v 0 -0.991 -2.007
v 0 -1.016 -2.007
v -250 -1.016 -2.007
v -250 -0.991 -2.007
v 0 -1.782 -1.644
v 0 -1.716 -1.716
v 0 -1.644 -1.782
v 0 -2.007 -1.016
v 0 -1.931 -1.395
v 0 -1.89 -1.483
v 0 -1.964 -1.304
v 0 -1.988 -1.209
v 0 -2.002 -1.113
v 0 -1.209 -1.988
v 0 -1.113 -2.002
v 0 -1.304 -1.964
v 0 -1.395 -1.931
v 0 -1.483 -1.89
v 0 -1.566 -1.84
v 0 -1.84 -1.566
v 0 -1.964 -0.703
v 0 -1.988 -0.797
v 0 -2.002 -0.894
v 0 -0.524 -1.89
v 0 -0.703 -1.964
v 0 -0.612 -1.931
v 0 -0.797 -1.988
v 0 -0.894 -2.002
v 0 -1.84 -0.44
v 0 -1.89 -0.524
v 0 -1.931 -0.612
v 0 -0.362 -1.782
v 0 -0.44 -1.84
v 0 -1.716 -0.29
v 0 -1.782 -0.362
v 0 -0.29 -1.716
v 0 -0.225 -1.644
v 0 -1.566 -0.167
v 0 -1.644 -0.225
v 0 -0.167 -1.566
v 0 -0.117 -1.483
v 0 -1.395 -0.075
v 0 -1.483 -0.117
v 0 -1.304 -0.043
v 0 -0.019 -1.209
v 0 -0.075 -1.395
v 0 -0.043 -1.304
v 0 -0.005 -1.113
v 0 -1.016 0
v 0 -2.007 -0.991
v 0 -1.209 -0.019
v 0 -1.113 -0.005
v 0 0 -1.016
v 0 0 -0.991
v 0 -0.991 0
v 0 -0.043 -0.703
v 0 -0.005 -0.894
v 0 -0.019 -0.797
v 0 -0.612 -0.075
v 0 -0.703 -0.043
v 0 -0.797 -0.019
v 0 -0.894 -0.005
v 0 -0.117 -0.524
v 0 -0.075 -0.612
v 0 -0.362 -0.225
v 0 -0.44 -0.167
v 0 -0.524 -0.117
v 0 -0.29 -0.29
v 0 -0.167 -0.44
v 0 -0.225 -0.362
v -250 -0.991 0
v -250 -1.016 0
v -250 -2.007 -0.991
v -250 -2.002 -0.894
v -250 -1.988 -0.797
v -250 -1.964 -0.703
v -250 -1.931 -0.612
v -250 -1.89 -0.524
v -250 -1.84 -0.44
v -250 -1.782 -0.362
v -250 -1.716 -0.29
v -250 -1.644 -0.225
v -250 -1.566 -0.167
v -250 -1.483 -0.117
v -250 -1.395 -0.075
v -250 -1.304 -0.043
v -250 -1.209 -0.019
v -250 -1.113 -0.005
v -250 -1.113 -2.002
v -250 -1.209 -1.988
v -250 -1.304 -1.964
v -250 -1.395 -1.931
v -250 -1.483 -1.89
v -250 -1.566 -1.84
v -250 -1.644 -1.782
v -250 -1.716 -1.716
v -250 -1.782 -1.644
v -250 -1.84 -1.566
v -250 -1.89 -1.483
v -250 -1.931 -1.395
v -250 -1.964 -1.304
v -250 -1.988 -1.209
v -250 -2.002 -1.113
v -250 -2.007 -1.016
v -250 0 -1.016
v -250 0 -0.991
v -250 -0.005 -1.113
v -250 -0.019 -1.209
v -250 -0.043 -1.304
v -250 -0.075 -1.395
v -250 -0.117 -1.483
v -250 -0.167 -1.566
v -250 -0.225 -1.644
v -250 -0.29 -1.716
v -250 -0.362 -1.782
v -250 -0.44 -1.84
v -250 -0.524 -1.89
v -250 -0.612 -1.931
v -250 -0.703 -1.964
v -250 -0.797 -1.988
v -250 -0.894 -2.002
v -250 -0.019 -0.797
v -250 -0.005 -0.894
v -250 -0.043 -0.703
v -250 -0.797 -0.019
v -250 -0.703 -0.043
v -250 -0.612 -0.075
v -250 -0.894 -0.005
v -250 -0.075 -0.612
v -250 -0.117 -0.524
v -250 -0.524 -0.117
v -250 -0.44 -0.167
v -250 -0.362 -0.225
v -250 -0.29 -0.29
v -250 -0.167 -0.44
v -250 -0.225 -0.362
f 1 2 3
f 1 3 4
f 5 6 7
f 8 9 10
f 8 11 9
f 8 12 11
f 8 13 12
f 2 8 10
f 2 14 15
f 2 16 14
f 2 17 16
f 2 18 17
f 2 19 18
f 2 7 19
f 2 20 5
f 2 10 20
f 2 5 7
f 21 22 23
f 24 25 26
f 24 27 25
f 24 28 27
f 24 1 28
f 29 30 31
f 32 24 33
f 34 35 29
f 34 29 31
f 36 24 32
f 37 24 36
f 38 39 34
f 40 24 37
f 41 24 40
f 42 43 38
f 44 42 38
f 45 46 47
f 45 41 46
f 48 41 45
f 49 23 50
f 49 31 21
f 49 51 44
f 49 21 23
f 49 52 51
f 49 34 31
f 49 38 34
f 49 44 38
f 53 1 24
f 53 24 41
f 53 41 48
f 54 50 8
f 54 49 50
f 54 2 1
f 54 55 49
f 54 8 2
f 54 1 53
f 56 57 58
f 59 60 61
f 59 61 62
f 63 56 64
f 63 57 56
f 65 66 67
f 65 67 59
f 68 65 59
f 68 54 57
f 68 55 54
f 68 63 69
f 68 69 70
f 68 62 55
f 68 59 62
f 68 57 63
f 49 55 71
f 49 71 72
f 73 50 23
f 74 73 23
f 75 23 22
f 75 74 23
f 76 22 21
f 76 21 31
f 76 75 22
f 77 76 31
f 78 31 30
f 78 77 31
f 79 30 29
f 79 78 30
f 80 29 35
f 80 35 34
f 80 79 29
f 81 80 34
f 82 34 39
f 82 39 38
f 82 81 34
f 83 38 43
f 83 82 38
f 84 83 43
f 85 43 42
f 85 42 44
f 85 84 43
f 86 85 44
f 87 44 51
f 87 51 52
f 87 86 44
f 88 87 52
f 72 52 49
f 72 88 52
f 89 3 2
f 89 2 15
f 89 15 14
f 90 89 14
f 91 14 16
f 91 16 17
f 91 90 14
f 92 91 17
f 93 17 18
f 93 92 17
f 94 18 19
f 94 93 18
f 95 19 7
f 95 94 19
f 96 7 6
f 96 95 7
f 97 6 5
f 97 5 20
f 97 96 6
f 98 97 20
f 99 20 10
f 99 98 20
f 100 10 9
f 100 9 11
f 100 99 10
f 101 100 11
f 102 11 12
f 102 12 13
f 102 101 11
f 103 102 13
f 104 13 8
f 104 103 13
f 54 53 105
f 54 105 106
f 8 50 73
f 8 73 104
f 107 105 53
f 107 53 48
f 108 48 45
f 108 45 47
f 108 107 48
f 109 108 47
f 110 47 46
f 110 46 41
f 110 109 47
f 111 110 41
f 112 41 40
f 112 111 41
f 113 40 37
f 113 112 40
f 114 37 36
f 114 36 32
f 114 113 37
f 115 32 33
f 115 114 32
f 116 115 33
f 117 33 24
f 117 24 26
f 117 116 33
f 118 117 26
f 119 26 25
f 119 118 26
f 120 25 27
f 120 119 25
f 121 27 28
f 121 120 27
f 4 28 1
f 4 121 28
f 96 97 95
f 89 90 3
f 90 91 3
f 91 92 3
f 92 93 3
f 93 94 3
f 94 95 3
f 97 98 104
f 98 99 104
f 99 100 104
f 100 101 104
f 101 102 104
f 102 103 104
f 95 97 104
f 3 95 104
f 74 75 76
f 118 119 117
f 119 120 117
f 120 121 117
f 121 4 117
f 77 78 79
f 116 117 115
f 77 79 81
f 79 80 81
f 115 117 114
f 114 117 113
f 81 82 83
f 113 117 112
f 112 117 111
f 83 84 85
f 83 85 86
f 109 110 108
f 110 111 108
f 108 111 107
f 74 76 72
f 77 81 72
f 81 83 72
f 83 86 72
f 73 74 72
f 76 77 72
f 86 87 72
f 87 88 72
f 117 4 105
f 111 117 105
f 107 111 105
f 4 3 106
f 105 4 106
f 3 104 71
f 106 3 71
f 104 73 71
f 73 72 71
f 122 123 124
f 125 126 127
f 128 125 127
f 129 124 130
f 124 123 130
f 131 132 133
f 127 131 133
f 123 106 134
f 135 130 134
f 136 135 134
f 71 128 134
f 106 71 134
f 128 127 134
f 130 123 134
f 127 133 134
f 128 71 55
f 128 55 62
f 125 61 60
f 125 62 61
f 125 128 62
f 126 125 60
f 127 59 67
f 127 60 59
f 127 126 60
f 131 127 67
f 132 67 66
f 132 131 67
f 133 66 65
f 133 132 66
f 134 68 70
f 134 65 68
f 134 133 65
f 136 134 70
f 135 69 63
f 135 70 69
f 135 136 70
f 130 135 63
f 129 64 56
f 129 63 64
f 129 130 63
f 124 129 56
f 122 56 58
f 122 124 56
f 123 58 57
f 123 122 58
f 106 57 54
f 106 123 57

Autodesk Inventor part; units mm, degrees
ref_plane "YZ Plane" through (0, 0, 0) normal (1, 0, 0) x (0, 1, 0)
ref_plane "XZ Plane" through (0, 0, 0) normal (0, 1, 0) x (-1, 0, 0)
ref_plane "XY Plane" through (0, 0, 0) normal (0, 0, 1) x (1, 0, 0)
sketch "Sketch1" plane through (0, 0, 0) normal (0, 1, 0) x (-1, 0, 0)
  arc A0 (-4, 0) -> (0, 0) centre (-2, 0.1626) ccw projected
  line L0 (0, 0) -> (-4, 0) projected
sketch "Sketch2" plane through (0, 0, 0) normal (1, 0, 0) x (0, 1, 0)
  line L0 (0, 0) -> (-2.0066, 0)
  line L1 (-2.0066, 0) -> (-2.0066, -2.0066)
  line L2 (-2.0066, -2.0066) -> (0, -2.0066)
  line L3 (0, -2.0066) -> (0, 0)
  dimension "d0" = 2.0066
  dimension "d1" = 2.0066
extrude "Extrusion1" add sketch "Sketch2" against normal blind 250
fillet "Fillet1" radius 0.9906 4 edges at (-125, 0, 0) (-125, -2.0066, 0) (-125, 0, -2.0066) (-125, -2.0066, -2.0066)
properties part number "LeverArm" material "Stainless Steel"
